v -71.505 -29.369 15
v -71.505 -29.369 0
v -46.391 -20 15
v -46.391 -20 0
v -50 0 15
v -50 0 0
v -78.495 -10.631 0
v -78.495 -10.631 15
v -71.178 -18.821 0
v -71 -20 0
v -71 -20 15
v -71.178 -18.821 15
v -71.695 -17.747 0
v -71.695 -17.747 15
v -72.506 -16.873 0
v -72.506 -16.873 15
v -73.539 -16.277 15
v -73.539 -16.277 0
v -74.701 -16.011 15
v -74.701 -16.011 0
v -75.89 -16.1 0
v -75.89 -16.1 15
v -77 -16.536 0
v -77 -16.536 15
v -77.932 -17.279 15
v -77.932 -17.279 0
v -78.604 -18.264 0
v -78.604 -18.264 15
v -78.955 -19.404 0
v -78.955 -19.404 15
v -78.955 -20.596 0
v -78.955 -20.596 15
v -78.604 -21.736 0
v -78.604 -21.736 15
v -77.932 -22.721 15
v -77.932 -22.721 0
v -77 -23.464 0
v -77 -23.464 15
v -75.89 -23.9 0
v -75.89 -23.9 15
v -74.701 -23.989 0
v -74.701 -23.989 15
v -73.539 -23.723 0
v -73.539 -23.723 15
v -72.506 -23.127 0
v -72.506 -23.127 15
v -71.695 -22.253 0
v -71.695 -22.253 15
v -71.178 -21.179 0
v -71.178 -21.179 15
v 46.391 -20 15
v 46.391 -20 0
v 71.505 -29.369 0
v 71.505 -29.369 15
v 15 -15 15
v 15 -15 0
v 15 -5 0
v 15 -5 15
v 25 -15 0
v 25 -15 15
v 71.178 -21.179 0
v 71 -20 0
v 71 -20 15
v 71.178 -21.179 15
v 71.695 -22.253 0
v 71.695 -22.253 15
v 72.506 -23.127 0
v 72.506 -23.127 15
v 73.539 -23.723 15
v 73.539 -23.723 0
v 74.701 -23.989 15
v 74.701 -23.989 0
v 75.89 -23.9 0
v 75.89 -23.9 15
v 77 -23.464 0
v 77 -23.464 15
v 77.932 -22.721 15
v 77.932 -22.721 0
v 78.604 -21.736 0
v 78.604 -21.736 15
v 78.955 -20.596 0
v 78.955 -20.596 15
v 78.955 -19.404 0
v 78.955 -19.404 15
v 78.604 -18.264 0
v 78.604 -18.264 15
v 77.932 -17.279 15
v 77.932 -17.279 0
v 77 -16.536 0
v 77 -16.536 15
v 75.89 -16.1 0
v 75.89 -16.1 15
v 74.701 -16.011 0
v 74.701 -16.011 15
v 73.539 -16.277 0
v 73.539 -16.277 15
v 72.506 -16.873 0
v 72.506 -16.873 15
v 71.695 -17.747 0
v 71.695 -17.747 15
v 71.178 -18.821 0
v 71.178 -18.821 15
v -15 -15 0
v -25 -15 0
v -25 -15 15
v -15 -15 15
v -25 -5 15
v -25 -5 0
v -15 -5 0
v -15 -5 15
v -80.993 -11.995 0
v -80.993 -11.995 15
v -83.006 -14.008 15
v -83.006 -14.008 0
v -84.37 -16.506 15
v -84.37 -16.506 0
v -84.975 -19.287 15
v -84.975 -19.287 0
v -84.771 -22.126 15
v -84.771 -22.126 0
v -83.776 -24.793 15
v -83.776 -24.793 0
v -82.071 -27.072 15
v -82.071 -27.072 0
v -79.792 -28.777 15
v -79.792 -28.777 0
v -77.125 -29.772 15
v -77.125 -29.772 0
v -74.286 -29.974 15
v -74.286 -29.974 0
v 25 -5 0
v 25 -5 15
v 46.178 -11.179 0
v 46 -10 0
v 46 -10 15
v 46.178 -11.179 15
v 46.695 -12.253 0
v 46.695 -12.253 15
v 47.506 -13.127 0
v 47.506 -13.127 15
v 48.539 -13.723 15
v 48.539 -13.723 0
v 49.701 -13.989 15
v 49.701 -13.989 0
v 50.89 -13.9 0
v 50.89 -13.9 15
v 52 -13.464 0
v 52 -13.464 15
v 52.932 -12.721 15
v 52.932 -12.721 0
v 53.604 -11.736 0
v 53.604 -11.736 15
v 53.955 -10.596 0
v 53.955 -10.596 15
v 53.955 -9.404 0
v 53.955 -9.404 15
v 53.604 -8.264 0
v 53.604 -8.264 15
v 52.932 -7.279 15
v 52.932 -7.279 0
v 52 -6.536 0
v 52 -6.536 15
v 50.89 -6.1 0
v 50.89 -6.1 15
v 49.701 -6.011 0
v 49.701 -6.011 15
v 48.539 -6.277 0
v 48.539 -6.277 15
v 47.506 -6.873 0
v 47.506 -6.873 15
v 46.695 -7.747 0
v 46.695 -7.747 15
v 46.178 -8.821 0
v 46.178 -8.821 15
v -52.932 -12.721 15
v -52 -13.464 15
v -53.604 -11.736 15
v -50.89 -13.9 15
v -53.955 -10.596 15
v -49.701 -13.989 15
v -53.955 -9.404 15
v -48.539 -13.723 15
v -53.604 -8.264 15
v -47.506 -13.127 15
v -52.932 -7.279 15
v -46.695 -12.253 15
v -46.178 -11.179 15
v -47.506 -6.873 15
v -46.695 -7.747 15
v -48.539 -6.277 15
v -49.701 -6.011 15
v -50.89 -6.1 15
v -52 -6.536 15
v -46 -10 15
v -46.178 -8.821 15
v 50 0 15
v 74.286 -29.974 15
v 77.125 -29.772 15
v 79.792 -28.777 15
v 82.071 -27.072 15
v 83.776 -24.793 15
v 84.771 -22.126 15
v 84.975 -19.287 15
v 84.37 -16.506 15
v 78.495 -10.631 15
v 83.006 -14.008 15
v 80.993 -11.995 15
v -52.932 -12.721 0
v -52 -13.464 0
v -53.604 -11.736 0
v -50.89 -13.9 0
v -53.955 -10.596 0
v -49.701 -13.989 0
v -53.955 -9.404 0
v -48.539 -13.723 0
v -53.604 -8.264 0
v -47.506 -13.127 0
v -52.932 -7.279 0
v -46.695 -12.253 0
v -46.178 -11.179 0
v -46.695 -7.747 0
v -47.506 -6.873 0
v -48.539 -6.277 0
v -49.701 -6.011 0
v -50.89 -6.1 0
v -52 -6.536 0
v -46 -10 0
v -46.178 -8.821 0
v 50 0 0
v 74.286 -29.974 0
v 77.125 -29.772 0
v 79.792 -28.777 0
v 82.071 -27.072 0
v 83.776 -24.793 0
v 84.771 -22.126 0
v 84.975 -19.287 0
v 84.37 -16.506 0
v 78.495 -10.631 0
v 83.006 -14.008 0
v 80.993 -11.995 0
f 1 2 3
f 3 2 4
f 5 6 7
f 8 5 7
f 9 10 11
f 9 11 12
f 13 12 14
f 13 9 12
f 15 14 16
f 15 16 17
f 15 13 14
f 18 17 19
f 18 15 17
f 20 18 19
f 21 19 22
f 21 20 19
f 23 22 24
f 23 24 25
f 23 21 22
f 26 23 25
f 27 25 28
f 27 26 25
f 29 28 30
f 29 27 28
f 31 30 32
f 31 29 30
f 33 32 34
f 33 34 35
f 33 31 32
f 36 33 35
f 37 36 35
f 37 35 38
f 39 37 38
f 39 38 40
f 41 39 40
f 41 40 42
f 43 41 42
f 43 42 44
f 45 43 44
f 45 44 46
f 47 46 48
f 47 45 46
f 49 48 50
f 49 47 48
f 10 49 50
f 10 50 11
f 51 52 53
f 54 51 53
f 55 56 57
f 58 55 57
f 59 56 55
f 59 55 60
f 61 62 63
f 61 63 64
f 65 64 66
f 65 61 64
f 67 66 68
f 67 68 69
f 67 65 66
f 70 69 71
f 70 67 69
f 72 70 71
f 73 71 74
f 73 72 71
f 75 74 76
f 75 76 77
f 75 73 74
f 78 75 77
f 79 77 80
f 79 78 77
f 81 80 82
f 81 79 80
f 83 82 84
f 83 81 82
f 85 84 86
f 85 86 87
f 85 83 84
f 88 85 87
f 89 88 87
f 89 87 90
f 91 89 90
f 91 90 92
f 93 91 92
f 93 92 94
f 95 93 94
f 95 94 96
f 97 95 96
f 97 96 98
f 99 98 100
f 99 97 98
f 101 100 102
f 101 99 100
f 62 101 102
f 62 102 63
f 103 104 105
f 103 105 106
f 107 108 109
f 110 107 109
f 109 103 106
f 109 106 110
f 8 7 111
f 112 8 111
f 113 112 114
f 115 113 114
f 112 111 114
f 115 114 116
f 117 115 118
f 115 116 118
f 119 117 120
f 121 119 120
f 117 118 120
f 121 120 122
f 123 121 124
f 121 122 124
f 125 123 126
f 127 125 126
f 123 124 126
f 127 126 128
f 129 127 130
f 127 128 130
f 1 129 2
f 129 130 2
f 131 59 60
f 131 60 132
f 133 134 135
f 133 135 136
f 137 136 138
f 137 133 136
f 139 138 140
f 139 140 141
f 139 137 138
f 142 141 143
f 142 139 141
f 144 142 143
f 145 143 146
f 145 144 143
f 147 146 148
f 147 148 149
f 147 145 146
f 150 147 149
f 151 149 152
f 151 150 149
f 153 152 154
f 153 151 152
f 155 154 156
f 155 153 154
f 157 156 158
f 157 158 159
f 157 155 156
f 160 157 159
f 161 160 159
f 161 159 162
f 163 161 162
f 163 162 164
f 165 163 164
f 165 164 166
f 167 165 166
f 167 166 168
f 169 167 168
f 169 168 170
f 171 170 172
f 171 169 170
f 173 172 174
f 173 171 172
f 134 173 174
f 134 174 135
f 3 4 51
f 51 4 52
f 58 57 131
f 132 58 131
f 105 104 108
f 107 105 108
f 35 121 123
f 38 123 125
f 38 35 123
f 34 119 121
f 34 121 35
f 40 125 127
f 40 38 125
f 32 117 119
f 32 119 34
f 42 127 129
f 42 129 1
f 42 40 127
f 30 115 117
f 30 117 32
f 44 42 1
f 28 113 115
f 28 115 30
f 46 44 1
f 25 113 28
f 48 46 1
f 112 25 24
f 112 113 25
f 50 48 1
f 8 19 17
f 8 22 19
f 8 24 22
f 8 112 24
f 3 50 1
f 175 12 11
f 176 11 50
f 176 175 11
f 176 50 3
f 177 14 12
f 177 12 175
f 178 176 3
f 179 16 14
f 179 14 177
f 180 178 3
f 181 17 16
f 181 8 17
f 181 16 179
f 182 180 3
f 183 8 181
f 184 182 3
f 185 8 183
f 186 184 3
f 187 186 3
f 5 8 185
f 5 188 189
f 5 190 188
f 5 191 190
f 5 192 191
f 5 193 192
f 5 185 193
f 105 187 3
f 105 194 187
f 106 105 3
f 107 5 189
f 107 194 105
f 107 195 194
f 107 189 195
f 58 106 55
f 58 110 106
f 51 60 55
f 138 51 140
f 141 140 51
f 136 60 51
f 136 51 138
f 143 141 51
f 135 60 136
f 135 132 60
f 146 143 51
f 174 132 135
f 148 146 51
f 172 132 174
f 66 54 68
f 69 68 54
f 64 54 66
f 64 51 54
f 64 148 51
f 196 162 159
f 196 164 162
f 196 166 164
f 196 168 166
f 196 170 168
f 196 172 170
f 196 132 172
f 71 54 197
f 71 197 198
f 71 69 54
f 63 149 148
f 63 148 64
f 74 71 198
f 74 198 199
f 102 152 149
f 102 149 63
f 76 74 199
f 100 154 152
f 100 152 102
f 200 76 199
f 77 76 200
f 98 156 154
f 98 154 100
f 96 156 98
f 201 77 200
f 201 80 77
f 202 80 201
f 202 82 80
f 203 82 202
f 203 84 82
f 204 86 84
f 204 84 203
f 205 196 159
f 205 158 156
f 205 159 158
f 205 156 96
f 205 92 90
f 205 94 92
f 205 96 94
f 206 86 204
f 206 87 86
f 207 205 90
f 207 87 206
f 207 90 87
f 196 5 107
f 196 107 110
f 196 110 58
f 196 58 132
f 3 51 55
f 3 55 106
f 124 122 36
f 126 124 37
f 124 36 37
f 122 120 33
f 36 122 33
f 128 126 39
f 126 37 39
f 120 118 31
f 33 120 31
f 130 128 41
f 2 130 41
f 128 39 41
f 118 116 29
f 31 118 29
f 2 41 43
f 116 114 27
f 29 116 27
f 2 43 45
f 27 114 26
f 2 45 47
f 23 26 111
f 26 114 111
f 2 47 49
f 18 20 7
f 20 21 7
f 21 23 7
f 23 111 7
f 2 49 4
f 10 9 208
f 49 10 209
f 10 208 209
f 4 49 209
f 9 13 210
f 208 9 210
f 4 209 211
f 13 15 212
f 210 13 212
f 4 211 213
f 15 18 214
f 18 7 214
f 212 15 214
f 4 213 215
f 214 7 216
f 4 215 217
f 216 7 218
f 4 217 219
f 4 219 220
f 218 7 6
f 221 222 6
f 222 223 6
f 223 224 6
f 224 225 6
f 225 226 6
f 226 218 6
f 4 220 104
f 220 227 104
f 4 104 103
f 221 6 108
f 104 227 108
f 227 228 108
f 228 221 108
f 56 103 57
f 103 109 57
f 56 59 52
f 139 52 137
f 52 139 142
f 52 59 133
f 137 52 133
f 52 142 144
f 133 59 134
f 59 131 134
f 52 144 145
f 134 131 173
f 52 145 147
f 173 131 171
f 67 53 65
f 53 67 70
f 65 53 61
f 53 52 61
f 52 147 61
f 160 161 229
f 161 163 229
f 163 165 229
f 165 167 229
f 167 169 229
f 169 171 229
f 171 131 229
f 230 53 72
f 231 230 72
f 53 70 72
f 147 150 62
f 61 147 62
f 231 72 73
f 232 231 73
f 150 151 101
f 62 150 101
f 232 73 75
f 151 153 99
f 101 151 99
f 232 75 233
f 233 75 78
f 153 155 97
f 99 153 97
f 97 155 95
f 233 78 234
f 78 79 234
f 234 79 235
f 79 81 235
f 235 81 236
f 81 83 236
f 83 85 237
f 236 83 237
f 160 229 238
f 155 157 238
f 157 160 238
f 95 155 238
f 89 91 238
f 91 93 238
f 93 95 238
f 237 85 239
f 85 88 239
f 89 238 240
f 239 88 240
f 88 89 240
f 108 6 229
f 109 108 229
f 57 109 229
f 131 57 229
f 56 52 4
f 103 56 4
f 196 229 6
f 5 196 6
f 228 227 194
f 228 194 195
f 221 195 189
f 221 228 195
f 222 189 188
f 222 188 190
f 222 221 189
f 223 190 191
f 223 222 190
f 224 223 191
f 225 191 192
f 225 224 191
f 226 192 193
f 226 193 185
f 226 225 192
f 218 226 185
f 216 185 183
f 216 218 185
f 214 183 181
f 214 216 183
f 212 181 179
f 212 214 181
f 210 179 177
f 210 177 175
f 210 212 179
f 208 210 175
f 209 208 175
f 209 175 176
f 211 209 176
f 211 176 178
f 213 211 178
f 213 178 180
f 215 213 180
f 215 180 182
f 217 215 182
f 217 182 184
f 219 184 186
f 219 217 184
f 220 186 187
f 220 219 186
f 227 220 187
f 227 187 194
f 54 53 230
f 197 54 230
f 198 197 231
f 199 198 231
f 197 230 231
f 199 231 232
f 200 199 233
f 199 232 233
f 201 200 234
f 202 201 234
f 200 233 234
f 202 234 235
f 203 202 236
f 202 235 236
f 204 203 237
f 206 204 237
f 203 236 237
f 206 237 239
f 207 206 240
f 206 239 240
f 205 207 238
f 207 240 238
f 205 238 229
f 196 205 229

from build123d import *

# Parameters (mm, degrees)
ESBO_O1_R                = 4
ESBO_O1_W                = 10
ESBO_O1_H                = 10
RESSALTO_EXTRUS_O1_DEPTH = 15


with BuildPart() as part:
    # Esboço1 → Ressalto-extrusão1 (new body)
    with BuildSketch(Plane.XY):
        with BuildLine():
            Line((78.495378078, -10.630777402), (50, 0))
            Line((50, 0), (0, 0))
            Line((0, 0), (-50, 0))
            Line((-50, 0), (-78.495378078, -10.630777402))
            ThreePointArc((-78.495378078, -10.630777402), (-84.369222598, -23.495378078), (-71.504621922, -29.369222598))
            Line((-71.504621922, -29.369222598), (-46.390791566, -20))
            Line((-46.390791566, -20), (46.390791566, -20))
            Line((46.390791566, -20), (71.504621922, -29.369222598))
            ThreePointArc((71.504621922, -29.369222598), (84.369222598, -23.495378078), (78.495378078, -10.630777402))
        make_face()
        with Locations((-50, -10)):
            Circle(ESBO_O1_R, mode=Mode.SUBTRACT)
        with Locations(Location((50, -10, 0), (0, 0, 180))):
            Circle(ESBO_O1_R, mode=Mode.SUBTRACT)
        with Locations((-75, -20)):
            Circle(ESBO_O1_R, mode=Mode.SUBTRACT)
        with Locations(Location((75, -20, 0), (0, 0, 180))):
            Circle(ESBO_O1_R, mode=Mode.SUBTRACT)
        with Locations((20, -10)):
            Rectangle(ESBO_O1_W, ESBO_O1_H, mode=Mode.SUBTRACT)
        with Locations((-20, -10)):
            Rectangle(ESBO_O1_W, ESBO_O1_H, mode=Mode.SUBTRACT)
    extrude(amount=RESSALTO_EXTRUS_O1_DEPTH)


solid = part.part
